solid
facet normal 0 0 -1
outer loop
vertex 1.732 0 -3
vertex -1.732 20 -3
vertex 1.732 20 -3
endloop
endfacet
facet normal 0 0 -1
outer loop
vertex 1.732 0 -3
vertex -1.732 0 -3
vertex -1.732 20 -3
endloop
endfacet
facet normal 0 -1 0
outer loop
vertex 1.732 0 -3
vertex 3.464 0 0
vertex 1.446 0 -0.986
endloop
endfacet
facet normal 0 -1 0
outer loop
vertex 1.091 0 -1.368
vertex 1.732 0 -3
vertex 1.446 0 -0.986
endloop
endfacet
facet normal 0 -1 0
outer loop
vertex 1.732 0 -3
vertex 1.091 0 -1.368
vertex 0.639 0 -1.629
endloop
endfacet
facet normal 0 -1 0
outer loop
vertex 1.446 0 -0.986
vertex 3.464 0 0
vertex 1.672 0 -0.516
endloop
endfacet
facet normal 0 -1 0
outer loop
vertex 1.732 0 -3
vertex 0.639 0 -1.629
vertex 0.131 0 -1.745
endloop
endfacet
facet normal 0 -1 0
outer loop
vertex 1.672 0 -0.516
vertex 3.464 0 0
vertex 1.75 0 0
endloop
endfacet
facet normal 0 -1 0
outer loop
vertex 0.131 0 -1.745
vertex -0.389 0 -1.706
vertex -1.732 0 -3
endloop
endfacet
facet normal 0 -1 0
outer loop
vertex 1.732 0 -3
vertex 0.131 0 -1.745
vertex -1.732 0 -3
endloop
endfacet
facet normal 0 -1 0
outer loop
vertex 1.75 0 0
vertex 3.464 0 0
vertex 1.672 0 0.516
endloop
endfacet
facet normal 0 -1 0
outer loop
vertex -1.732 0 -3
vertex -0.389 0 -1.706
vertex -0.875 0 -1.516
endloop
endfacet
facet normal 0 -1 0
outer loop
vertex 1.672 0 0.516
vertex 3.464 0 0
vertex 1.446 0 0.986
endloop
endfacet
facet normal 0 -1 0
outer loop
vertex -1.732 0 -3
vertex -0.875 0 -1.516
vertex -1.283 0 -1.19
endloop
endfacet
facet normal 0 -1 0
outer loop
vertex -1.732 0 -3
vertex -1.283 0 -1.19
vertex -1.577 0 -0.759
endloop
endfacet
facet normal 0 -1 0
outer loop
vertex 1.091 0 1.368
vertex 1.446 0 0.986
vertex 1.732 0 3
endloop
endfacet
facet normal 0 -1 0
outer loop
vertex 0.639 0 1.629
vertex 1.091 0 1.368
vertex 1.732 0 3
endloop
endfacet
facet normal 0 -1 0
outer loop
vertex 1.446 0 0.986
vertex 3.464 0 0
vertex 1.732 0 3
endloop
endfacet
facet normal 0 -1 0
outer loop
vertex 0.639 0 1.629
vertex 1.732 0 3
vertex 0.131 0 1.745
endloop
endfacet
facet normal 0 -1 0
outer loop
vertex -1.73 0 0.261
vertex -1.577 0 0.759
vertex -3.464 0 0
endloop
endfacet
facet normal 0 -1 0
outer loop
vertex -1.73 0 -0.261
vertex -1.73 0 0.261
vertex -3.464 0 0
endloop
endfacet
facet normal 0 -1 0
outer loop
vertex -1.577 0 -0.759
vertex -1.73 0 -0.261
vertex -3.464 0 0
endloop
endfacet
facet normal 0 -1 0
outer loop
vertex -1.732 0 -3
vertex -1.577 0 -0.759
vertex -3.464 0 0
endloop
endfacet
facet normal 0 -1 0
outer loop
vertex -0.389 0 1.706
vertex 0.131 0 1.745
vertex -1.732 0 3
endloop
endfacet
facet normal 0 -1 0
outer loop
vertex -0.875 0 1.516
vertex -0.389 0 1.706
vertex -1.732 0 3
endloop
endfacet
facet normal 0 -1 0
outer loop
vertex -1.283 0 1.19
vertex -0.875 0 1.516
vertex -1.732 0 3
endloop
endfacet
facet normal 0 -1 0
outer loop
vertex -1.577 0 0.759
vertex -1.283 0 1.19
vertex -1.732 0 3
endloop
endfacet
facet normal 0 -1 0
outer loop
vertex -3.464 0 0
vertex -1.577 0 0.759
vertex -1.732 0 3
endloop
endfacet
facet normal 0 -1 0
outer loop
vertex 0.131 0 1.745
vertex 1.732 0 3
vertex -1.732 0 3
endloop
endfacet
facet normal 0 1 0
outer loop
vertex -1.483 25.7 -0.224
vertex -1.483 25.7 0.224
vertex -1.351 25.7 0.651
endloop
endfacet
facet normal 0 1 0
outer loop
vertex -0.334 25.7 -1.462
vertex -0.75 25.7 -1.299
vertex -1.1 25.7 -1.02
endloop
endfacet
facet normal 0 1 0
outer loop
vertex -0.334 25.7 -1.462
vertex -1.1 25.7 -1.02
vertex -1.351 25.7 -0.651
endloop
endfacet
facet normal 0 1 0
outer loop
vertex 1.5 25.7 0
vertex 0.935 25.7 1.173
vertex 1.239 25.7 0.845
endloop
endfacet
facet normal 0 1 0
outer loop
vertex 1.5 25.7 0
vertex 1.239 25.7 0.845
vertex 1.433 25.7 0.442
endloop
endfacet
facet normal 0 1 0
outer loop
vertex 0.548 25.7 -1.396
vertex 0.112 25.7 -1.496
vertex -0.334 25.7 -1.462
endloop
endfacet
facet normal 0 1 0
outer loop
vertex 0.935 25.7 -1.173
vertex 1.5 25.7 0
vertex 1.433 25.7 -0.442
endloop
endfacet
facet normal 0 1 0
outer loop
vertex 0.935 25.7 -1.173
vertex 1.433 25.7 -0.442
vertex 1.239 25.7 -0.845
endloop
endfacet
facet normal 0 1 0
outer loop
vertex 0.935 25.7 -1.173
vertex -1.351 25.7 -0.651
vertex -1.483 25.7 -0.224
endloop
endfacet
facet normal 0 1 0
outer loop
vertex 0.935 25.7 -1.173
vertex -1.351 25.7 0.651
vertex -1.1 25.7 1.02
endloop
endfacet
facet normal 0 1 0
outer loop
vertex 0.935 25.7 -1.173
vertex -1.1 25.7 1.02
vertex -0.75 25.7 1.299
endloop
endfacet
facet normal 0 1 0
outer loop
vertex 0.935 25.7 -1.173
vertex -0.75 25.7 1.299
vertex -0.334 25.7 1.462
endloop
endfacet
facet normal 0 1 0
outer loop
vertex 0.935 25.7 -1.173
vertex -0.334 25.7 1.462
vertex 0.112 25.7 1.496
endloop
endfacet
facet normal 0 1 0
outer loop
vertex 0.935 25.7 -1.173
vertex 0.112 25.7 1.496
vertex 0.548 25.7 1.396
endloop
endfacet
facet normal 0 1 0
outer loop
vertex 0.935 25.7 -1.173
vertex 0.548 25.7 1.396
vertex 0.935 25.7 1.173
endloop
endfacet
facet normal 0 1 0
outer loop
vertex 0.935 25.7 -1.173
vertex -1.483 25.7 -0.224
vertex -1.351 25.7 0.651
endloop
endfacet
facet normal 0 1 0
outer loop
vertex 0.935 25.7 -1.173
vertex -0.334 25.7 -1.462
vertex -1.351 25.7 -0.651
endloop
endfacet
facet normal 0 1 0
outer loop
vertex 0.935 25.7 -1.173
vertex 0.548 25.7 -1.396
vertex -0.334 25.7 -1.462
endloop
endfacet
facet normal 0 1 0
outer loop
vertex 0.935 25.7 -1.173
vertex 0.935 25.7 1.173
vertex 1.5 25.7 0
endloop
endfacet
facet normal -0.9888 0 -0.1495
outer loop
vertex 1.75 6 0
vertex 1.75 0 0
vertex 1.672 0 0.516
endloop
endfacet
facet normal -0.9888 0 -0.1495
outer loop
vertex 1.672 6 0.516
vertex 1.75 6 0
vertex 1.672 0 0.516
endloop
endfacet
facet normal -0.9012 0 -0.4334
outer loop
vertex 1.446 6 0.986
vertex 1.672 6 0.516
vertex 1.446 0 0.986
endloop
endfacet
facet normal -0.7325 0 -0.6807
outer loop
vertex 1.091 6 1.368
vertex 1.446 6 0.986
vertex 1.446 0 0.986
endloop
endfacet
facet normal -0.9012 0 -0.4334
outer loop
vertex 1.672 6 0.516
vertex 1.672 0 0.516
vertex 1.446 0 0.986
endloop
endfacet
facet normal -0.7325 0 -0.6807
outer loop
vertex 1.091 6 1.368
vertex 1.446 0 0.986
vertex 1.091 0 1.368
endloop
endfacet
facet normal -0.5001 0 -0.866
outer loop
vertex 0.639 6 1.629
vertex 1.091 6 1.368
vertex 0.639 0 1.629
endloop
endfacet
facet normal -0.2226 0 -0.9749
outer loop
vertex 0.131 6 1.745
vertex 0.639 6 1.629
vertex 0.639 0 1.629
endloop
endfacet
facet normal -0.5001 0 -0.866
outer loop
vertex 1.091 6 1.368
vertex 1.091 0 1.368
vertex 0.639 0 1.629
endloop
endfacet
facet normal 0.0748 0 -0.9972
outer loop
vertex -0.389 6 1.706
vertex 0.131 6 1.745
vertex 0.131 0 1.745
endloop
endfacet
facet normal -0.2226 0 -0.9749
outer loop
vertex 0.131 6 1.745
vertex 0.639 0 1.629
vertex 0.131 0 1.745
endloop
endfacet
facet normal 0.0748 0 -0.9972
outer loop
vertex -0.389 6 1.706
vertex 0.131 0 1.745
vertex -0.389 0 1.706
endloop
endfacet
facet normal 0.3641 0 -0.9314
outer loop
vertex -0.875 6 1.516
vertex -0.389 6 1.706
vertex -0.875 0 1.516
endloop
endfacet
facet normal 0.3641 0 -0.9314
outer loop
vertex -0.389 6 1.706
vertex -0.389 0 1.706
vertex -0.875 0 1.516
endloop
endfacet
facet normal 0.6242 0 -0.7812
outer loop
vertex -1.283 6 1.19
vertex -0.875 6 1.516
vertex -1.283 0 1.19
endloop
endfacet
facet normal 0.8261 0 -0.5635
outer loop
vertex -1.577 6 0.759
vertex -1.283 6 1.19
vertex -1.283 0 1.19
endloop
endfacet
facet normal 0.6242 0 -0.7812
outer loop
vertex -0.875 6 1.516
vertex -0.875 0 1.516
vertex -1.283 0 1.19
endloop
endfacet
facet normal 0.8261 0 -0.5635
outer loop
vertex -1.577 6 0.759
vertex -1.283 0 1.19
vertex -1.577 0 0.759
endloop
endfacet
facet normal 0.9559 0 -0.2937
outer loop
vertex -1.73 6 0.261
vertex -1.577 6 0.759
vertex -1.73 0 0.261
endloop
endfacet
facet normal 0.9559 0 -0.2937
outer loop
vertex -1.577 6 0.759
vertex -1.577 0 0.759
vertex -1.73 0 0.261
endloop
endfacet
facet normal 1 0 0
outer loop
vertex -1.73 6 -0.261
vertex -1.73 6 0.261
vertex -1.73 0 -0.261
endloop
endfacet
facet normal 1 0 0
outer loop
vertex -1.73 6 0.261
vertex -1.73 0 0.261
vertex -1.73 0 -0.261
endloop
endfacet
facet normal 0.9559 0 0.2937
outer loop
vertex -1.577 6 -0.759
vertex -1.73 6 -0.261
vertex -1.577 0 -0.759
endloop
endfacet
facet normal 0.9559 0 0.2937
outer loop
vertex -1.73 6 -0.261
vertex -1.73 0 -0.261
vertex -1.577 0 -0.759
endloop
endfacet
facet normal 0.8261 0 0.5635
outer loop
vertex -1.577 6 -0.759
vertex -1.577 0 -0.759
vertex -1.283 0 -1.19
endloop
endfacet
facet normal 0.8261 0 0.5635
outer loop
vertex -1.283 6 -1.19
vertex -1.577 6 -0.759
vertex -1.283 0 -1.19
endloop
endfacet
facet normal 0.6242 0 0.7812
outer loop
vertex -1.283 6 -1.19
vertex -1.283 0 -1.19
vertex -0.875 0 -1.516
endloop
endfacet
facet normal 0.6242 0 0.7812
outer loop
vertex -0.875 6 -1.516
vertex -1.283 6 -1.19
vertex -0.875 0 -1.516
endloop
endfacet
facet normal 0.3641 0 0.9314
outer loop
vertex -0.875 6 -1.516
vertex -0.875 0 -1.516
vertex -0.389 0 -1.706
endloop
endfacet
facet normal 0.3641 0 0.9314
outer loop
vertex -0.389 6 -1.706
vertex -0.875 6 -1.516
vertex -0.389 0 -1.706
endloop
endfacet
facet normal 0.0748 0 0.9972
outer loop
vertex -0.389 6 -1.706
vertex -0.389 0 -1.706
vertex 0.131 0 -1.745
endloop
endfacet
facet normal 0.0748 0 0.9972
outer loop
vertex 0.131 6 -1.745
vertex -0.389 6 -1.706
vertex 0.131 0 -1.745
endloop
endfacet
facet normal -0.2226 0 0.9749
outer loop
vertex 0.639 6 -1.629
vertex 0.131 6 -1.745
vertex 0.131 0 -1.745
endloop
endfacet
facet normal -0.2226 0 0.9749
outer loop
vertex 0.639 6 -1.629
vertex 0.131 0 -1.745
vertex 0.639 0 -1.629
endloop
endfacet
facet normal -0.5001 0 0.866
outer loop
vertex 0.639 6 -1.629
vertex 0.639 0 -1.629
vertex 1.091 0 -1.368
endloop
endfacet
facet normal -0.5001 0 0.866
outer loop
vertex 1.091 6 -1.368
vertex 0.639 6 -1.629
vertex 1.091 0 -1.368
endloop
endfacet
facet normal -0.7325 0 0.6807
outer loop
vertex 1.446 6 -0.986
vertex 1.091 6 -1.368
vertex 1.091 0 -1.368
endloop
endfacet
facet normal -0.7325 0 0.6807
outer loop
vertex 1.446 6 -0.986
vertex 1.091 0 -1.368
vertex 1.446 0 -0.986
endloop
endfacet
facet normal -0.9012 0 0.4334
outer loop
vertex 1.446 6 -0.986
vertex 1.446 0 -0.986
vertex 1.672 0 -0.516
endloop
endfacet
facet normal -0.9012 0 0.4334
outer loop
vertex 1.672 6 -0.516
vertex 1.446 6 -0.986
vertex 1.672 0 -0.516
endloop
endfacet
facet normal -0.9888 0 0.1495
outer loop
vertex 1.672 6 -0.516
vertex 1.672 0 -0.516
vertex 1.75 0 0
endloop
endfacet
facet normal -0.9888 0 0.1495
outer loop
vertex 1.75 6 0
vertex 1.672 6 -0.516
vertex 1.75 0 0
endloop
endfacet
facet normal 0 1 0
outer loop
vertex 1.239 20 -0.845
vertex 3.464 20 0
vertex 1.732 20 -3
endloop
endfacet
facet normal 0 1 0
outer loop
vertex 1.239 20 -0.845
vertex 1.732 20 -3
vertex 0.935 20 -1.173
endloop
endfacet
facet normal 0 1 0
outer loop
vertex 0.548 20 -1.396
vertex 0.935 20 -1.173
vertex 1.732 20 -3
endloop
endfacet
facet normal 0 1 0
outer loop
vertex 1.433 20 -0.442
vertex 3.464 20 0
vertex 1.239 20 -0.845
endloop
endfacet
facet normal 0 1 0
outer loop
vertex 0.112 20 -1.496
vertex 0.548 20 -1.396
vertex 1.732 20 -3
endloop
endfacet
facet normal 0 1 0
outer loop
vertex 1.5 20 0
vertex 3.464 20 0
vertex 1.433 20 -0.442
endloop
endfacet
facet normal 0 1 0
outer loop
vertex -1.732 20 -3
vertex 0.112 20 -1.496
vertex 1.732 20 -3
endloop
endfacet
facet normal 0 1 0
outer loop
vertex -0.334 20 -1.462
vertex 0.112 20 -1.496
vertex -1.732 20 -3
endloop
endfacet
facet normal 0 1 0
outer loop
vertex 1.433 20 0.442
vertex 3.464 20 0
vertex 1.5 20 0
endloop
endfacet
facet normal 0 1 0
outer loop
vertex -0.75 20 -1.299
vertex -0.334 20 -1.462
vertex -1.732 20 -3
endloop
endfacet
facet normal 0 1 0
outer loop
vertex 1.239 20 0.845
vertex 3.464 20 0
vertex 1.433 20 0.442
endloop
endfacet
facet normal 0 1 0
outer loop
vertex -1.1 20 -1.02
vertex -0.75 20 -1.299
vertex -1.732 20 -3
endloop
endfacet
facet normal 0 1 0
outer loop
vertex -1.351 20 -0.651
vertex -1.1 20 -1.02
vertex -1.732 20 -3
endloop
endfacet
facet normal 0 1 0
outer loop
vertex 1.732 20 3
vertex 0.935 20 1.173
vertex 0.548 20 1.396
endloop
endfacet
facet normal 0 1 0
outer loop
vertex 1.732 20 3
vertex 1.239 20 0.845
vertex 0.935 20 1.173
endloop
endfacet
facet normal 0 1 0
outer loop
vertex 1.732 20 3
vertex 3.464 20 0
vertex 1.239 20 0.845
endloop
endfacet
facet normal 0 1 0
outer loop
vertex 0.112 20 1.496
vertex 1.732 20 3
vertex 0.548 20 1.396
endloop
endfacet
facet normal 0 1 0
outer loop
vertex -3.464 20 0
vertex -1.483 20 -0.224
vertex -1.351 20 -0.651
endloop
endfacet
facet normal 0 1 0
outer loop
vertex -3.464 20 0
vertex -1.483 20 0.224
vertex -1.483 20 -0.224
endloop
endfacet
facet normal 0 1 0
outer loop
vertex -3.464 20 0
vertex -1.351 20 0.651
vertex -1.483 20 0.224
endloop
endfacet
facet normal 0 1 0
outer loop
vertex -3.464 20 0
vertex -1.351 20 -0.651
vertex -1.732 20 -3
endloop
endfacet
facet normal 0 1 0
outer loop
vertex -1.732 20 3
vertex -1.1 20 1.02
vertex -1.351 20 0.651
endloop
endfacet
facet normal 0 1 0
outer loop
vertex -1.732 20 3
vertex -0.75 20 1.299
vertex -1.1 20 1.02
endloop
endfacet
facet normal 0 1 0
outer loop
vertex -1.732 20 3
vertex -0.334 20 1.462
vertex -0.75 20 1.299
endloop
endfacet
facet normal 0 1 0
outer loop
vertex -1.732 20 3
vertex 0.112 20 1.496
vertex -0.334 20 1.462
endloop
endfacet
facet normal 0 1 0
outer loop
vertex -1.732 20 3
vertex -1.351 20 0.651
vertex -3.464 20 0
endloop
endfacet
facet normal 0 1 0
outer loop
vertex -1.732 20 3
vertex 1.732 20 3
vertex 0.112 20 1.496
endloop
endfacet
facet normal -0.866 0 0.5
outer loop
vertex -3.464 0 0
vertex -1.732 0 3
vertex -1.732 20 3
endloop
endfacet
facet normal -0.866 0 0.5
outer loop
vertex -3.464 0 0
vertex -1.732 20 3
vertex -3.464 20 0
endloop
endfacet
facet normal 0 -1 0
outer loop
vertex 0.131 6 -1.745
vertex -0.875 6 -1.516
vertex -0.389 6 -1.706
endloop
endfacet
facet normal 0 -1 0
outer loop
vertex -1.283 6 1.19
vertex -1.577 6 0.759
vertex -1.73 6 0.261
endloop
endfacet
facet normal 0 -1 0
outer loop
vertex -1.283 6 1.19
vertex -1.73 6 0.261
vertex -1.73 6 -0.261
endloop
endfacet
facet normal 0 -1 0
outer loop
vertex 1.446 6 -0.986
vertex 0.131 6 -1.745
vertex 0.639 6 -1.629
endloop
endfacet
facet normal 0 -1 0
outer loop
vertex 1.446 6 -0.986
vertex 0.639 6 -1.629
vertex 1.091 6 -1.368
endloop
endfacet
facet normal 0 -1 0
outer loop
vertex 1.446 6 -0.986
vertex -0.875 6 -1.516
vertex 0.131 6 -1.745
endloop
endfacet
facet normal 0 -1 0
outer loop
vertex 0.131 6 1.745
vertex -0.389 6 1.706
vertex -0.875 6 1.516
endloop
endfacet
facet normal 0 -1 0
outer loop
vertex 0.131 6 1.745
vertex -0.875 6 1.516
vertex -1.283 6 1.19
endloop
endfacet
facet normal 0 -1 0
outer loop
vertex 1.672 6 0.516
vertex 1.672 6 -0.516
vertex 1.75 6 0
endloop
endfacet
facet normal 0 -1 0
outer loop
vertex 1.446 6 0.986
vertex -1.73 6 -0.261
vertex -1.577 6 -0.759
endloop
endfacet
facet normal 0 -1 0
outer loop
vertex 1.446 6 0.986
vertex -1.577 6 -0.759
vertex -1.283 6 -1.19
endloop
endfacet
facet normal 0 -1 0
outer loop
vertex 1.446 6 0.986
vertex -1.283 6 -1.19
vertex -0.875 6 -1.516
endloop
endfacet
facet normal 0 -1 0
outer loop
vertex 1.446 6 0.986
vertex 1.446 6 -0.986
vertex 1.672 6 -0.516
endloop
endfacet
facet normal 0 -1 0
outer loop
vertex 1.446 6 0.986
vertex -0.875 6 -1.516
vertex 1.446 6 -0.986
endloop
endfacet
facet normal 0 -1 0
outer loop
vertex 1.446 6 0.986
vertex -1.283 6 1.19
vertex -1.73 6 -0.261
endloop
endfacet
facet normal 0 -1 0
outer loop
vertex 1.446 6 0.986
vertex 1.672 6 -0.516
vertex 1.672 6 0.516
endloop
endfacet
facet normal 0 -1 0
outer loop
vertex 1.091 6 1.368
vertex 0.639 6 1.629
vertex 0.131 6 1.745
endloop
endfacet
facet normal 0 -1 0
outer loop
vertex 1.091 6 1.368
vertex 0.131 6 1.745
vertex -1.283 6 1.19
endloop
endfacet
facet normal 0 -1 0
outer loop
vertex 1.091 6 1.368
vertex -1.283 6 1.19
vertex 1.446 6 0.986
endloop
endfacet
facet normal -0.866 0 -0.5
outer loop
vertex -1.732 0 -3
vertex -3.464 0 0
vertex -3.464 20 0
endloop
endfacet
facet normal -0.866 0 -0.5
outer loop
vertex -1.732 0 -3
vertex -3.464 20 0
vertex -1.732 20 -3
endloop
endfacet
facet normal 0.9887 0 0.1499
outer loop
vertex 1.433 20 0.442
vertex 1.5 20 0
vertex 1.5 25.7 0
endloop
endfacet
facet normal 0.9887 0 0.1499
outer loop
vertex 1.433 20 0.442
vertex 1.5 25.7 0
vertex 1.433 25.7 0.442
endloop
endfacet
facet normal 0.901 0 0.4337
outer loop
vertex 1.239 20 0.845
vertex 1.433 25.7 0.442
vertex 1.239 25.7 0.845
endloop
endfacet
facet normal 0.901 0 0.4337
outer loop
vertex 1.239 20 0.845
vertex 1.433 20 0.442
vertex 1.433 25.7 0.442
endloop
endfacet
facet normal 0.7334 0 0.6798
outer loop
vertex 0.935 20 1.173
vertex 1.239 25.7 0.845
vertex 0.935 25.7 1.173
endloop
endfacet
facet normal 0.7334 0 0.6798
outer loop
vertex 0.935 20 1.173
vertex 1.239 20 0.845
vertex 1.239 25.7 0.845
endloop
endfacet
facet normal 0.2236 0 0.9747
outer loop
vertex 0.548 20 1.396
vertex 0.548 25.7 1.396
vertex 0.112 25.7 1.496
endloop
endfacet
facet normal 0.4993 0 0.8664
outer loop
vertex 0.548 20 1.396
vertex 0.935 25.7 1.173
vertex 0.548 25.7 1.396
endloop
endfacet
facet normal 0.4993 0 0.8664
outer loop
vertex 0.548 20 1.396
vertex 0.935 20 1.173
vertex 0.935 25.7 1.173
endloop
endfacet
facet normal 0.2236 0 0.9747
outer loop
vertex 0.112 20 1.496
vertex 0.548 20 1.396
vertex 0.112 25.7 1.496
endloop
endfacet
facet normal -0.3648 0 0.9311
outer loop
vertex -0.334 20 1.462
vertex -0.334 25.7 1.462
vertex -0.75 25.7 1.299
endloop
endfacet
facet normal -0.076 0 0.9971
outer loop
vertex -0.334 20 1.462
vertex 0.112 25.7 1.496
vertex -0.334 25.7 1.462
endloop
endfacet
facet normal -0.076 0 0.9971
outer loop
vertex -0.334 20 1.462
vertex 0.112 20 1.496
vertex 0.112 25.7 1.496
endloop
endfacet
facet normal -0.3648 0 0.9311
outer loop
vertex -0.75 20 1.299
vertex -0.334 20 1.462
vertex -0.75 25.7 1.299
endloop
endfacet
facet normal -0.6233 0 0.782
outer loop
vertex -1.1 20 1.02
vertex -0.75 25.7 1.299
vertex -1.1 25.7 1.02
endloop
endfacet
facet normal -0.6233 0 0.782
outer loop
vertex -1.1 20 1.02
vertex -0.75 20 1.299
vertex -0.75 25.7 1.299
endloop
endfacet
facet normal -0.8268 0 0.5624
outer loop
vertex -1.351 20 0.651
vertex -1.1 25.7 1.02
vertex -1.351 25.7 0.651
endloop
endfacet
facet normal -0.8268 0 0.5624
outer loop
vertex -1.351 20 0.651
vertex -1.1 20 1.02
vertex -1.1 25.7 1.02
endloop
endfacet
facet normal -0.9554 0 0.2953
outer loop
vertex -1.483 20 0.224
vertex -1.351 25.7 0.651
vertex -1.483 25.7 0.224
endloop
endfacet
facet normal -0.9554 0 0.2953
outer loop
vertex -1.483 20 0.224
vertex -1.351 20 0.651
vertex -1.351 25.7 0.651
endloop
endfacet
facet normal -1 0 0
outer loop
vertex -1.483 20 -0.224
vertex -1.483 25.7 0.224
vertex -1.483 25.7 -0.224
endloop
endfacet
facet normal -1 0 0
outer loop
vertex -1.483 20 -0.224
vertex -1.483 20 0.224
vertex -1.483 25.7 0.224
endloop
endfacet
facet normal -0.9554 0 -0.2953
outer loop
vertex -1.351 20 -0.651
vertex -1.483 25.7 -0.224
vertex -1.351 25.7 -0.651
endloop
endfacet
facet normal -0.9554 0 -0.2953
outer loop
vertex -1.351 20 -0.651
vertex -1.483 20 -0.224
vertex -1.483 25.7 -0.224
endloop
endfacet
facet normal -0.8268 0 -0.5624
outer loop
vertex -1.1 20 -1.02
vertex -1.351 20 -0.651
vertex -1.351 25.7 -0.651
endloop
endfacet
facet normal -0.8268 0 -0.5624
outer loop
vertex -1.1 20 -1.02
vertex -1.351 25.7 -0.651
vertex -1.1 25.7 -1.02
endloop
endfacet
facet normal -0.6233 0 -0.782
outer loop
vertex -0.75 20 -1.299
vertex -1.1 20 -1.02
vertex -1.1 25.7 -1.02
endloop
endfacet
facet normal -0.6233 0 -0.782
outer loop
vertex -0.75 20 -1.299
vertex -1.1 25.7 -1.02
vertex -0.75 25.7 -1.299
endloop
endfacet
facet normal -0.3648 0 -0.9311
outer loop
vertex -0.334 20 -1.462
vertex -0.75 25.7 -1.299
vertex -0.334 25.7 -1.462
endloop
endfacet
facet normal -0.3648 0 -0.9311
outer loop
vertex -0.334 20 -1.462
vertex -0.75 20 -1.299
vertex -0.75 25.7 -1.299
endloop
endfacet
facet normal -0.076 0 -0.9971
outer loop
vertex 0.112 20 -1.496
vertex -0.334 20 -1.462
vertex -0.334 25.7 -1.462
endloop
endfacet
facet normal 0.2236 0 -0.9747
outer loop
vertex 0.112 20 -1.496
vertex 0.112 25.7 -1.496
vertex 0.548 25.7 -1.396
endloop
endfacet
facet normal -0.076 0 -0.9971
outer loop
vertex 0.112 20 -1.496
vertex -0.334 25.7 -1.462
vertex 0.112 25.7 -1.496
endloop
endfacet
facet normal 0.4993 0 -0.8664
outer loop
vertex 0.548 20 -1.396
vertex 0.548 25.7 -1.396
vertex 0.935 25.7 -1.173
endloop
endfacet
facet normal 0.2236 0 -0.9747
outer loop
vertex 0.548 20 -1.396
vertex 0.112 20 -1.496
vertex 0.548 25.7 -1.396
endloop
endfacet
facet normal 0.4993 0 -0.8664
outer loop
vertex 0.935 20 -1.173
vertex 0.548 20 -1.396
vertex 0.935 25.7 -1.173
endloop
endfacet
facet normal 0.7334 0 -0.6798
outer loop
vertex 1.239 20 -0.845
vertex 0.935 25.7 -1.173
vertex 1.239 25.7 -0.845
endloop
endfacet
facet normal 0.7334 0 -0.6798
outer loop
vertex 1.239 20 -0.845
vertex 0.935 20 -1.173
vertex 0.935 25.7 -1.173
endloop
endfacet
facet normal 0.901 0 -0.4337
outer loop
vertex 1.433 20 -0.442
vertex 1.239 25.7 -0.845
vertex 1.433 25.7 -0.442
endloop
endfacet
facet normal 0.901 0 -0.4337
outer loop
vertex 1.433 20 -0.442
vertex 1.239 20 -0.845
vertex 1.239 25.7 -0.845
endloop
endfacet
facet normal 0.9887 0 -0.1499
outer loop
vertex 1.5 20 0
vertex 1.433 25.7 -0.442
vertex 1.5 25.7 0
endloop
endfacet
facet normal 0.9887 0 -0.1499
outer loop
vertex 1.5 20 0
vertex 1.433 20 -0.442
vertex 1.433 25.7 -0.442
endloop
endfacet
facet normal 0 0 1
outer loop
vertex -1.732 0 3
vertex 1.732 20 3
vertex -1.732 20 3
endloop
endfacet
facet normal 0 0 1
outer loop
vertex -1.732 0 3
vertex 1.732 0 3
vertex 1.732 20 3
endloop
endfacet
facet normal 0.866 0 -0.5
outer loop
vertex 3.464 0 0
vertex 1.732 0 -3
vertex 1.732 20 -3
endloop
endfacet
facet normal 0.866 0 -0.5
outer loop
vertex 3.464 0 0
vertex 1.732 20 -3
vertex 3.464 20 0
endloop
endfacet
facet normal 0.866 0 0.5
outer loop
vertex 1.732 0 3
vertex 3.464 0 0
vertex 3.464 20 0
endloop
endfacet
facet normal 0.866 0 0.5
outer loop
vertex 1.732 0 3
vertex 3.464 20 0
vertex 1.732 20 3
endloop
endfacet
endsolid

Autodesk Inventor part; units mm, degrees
ref_plane "YZ Plane" through (0, 0, 0) normal (1, 0, 0) x (0, 1, 0)
ref_plane "XZ Plane" through (0, 0, 0) normal (0, 1, 0) x (-1, 0, 0)
ref_plane "XY Plane" through (0, 0, 0) normal (0, 0, 1) x (1, 0, 0)
sketch "Sketch1" plane through (0, 0, 0) normal (0, 1, 0) x (-1, 0, 0)
  line L0 (-3.4641, 0) -> (-1.7321, 3)
  line L1 (-1.7321, 3) -> (1.7321, 3)
  line L2 (1.7321, 3) -> (3.4641, 0)
  line L3 (3.4641, 0) -> (1.7321, -3)
  line L4 (1.7321, -3) -> (-1.7321, -3)
  line L5 (-1.7321, -3) -> (-3.4641, 0)
  point P0 (0, 0)
  point P1 (0, 0)
  dimension "d1" = 6
extrude "Extrusion1" add sketch "Sketch1" along normal blind 20
sketch "Sketch2" plane through (0, 0, 0) normal (0, -1, 0) x (1, 0, 0)
  circle A0 centre (0, 0) radius 1.75
  dimension "d4" = 3.5
sketch "Sketch3" plane through (0, 20, 0) normal (0, 1, 0) x (1, 0, 0)
  circle A0 centre (0, 0) radius 1.5
  dimension "d5" = 3
extrude "Extrusion2" add sketch "Sketch3" along normal blind 5.7
extrude "Extrusion3" cut sketch "Sketch2" against normal blind 6
thread "Thread1" size "M3x0.35" class "6g" standard "ANSI Metric M Profile" full length
thread "Thread2" size "M4x0.5" class "6H" standard "ANSI Metric M Profile" full length
properties part number "spacer2cm"
